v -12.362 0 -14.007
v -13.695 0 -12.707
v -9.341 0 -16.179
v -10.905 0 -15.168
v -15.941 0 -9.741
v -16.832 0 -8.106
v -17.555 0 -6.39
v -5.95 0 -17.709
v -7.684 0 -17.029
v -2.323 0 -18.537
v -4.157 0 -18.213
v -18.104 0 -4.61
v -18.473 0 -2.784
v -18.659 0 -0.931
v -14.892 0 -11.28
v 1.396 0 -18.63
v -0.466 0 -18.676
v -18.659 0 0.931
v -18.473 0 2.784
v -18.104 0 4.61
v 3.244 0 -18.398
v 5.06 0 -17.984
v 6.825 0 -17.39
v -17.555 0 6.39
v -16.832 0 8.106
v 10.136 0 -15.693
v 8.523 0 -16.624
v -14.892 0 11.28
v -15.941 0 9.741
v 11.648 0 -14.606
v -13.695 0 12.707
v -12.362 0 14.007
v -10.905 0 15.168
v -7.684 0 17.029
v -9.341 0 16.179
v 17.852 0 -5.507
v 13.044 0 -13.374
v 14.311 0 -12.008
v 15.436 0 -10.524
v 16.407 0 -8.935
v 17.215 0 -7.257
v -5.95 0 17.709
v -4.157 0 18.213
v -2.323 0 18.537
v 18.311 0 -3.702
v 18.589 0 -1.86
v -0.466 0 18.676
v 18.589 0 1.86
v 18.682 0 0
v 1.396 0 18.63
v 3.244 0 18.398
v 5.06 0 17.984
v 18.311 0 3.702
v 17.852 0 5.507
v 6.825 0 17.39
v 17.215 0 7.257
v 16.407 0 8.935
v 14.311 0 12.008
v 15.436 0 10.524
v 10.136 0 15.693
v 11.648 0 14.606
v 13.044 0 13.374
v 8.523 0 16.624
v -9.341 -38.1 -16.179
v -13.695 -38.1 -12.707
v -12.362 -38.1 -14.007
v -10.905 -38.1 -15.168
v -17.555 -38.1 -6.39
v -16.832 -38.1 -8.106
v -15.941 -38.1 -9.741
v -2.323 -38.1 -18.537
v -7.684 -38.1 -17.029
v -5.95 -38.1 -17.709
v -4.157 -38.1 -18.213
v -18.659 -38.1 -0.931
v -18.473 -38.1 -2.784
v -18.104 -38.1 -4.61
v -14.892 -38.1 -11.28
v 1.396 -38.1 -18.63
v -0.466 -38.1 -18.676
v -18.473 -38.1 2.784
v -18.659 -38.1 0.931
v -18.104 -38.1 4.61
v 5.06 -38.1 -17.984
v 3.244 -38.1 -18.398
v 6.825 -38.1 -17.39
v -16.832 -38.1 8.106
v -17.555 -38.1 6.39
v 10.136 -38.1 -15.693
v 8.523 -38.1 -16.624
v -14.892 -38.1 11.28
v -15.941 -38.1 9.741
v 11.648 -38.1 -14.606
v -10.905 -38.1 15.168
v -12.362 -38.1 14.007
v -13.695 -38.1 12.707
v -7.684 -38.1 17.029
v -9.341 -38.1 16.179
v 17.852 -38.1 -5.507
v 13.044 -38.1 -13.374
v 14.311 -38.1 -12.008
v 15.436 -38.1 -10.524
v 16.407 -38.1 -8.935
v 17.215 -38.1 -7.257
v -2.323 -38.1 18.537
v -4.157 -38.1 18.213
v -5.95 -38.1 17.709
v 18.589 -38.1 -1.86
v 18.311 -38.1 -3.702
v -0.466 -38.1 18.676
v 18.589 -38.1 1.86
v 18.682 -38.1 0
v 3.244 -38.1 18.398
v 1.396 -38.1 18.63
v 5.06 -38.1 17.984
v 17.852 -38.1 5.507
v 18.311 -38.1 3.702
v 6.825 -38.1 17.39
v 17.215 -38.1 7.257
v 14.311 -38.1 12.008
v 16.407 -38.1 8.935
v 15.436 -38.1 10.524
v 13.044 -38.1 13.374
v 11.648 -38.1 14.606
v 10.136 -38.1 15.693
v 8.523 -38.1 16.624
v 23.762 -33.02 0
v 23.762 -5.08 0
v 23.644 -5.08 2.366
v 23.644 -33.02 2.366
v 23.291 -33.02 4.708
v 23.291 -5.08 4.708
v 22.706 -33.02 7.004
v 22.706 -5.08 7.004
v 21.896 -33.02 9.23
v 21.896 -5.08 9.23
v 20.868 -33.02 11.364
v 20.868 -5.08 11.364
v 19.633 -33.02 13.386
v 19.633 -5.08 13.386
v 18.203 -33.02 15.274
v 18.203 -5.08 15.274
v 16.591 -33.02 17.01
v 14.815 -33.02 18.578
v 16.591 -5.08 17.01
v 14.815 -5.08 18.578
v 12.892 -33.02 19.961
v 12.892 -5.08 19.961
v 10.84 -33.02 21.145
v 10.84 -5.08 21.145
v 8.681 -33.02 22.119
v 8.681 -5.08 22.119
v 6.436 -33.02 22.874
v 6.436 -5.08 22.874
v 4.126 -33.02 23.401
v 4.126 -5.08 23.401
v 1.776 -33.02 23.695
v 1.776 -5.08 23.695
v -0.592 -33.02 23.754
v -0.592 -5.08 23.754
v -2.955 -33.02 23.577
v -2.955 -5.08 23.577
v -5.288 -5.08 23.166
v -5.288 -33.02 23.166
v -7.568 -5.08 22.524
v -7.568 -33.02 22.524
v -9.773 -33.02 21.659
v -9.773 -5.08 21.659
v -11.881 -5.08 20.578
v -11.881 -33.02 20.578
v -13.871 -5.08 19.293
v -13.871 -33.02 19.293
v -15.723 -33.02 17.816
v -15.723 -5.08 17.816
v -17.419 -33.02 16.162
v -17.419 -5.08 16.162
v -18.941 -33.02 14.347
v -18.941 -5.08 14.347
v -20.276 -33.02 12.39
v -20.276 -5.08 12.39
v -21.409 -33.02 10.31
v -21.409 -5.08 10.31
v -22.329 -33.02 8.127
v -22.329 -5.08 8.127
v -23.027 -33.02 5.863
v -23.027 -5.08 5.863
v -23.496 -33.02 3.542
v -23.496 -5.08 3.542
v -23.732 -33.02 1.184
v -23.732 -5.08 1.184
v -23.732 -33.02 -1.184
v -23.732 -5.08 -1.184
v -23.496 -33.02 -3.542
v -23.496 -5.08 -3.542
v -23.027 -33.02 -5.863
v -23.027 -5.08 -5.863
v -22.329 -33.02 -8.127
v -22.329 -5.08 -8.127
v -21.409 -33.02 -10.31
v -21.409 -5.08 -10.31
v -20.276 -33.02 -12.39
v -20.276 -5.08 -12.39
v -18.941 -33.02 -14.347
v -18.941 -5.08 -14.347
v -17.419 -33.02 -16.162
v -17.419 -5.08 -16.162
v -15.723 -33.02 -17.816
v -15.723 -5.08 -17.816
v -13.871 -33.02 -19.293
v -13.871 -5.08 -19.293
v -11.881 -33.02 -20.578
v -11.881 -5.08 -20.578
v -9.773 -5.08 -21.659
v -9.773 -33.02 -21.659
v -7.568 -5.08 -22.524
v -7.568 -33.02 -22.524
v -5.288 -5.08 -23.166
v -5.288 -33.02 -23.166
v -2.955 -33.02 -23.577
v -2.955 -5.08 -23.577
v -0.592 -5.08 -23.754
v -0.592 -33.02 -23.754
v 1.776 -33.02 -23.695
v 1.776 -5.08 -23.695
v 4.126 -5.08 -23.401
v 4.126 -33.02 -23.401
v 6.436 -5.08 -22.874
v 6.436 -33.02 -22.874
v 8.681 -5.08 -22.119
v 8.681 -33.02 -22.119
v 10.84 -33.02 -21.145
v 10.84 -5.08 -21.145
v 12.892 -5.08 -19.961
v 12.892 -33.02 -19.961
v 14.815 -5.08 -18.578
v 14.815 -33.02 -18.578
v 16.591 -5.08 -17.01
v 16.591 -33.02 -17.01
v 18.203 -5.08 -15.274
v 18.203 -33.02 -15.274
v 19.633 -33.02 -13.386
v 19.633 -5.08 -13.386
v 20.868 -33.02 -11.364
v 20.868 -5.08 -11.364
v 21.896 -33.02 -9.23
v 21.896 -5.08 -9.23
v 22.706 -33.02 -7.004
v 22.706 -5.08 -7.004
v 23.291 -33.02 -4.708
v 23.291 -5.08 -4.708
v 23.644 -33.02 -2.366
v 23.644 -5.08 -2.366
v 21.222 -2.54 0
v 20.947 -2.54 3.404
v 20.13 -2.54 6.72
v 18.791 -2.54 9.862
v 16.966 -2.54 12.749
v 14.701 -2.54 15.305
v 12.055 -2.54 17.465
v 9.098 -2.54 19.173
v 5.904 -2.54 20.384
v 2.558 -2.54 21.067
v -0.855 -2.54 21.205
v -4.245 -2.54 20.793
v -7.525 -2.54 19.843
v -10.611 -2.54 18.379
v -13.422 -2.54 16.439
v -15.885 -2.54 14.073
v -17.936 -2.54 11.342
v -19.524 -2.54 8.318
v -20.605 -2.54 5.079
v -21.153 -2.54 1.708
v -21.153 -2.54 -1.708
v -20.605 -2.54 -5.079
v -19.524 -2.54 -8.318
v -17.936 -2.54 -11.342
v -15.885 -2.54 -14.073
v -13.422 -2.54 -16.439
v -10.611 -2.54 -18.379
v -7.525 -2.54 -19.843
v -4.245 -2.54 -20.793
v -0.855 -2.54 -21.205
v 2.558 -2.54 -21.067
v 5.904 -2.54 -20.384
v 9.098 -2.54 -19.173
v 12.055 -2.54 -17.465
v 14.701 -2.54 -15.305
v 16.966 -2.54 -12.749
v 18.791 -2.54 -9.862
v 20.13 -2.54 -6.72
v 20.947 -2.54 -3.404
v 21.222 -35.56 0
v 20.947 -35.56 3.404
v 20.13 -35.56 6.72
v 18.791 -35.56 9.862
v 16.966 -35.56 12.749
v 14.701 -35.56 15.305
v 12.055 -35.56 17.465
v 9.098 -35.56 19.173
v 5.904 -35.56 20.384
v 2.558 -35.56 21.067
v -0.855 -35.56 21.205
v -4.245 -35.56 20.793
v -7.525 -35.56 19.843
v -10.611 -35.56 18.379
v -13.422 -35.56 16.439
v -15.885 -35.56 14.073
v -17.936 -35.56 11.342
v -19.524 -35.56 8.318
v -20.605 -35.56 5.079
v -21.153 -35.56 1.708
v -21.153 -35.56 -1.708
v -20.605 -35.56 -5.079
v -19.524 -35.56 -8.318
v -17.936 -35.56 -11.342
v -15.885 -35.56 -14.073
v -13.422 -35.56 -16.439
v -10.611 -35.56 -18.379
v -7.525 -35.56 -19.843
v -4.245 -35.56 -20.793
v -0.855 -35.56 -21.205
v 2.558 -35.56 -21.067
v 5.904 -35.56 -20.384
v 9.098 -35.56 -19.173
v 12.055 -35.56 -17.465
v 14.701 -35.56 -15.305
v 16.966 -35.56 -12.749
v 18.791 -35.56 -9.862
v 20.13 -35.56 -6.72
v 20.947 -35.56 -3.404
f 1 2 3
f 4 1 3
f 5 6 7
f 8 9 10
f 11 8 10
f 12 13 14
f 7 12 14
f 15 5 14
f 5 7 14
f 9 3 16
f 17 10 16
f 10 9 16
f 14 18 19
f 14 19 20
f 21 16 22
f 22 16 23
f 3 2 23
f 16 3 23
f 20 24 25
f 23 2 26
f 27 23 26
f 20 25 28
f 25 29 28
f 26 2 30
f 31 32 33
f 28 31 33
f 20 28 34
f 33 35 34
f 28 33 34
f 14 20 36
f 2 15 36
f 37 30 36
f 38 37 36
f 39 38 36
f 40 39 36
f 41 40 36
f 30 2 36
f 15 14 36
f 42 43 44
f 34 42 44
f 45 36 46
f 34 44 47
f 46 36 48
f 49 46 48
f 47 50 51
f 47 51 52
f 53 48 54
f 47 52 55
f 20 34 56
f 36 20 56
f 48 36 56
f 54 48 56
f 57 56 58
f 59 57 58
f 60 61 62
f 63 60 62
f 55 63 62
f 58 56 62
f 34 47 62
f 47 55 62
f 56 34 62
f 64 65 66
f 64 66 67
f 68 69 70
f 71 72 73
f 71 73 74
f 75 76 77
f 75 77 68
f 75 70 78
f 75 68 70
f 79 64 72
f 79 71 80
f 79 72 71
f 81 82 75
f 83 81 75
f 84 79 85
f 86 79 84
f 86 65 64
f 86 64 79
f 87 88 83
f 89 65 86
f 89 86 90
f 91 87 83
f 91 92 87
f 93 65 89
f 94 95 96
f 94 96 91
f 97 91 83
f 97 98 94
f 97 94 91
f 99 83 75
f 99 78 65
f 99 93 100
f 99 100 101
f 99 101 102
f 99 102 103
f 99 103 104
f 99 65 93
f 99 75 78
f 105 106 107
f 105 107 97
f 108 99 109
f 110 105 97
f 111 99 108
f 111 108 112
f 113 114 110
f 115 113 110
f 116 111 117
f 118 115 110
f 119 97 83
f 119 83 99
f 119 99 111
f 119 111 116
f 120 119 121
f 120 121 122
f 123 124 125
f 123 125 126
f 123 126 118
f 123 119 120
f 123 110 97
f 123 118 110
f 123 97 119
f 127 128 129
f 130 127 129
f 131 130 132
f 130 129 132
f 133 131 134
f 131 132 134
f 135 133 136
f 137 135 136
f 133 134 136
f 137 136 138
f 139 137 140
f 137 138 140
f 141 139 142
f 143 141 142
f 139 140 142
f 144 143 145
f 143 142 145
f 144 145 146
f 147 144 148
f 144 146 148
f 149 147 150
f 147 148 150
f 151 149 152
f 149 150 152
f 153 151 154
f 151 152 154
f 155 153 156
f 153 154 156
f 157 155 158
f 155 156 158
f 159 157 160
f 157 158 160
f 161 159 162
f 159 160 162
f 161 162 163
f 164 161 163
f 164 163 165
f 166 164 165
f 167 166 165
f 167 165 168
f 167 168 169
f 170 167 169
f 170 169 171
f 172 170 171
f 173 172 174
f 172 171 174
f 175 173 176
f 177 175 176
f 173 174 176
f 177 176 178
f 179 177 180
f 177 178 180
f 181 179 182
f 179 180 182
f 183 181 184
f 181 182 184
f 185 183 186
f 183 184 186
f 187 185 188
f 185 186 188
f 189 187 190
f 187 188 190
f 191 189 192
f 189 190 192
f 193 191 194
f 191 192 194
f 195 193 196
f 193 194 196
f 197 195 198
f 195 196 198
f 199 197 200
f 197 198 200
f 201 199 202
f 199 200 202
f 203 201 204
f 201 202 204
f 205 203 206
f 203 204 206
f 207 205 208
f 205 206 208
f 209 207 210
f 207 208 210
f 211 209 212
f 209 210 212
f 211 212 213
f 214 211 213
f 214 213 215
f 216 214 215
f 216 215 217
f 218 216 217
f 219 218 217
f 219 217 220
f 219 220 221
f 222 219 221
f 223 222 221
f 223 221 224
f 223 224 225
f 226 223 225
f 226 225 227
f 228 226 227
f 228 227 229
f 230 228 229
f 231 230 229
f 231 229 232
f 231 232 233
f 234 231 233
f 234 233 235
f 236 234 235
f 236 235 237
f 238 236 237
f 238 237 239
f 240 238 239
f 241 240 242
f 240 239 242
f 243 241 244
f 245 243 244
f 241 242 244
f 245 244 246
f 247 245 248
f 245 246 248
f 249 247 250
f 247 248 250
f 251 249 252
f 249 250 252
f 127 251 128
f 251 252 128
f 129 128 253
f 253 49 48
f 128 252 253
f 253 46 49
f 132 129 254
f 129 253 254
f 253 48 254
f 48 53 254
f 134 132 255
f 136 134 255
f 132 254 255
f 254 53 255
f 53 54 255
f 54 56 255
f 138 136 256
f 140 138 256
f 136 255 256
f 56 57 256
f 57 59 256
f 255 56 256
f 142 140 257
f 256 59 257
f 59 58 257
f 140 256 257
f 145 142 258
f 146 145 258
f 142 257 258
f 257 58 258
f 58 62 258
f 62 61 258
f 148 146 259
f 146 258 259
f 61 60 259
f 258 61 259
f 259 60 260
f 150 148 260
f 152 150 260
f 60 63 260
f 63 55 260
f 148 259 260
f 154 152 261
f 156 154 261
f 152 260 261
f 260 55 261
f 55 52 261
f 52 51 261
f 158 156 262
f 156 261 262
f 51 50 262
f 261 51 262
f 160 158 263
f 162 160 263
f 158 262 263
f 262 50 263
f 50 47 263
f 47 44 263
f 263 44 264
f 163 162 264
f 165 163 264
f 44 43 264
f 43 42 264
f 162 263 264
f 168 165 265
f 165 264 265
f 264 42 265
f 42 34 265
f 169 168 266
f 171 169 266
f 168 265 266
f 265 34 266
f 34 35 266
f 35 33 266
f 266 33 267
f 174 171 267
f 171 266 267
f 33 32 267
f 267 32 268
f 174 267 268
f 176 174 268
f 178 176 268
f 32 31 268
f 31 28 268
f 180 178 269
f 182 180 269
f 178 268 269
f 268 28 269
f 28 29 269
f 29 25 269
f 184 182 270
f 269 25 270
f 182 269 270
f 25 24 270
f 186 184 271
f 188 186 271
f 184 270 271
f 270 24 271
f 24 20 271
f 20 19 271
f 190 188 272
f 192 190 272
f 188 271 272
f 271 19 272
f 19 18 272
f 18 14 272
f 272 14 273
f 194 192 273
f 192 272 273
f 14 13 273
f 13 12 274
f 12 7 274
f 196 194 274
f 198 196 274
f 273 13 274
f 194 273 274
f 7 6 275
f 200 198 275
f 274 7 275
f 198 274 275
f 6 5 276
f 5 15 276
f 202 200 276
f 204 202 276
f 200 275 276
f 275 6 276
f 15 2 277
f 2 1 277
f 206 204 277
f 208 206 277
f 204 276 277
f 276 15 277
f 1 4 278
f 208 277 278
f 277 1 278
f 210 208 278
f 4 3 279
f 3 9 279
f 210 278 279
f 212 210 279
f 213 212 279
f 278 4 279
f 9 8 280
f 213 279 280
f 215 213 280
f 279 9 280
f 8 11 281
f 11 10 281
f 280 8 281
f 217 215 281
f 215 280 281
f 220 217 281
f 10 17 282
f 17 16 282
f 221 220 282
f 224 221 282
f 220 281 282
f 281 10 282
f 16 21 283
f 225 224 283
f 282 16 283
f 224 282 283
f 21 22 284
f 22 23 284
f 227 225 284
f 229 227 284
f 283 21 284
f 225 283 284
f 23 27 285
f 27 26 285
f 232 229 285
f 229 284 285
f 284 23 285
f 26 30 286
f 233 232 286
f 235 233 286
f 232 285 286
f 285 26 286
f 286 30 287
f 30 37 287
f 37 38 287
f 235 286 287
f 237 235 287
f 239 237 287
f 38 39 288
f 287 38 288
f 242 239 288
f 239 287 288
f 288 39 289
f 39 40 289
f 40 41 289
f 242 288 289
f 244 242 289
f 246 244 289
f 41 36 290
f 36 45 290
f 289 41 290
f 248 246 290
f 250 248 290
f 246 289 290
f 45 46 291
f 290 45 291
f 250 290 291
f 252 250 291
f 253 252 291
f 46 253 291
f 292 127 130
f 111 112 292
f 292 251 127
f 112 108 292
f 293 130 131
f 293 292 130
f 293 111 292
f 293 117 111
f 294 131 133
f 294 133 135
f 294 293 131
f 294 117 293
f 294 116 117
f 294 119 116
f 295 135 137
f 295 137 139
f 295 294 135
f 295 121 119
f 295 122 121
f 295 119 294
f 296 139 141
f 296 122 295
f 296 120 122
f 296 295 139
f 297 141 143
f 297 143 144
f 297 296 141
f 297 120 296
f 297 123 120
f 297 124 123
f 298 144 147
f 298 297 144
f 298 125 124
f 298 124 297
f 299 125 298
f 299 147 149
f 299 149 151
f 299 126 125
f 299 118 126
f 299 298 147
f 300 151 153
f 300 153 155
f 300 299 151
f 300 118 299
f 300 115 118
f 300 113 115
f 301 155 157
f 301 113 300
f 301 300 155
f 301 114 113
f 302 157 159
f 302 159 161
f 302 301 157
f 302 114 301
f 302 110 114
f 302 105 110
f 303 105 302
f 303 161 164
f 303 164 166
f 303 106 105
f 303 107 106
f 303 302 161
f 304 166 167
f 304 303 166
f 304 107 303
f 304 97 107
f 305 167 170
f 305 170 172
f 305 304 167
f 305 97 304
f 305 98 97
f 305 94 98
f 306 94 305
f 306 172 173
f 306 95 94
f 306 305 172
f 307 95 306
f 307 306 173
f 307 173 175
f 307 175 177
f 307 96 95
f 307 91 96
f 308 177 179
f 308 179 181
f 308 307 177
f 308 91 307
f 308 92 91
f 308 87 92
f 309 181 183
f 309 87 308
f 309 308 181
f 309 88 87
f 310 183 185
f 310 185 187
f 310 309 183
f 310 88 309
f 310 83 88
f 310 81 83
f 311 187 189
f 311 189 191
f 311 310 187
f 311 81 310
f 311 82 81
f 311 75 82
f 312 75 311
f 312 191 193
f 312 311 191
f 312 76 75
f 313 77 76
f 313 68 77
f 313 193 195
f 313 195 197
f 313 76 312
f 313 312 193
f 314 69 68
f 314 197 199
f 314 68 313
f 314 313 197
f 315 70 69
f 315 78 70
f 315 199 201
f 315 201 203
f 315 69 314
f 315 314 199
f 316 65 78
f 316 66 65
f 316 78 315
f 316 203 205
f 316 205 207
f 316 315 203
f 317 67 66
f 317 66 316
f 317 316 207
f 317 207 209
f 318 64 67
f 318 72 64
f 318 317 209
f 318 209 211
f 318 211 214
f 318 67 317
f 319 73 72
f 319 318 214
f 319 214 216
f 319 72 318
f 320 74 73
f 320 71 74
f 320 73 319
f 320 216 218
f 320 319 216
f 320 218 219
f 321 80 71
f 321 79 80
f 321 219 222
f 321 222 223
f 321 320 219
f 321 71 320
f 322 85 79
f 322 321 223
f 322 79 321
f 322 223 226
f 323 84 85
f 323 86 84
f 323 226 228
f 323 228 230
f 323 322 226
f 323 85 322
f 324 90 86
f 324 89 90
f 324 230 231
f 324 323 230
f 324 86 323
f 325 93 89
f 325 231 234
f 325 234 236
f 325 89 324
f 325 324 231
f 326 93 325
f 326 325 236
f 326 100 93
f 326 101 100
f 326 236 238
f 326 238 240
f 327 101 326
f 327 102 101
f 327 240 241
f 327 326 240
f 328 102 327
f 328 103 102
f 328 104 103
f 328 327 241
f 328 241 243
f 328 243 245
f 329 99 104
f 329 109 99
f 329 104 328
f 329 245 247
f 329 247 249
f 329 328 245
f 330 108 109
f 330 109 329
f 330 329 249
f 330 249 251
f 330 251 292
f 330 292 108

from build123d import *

# Parameters (mm, degrees)
F0_R     = 23.761832
F1_DEPTH = 38.1
F2_SIZE  = 5.08
F3_SIZE  = 5.08


with BuildPart() as f1:
    # F0 (on Front) → F1 (new body)
    with BuildSketch(Plane.XZ):
        Circle(F0_R)
    extrude(amount=F1_DEPTH)

    # F2
    f2_edges = [f1.edges().sort_by_distance(p)[0] for p in [
        (-23.761832, -38.1, 0),
    ]]
    chamfer(f2_edges, length=F2_SIZE)

    # F3
    f3_edges = [f1.edges().sort_by_distance(p)[0] for p in [
        (-23.761832, 0, 0),
    ]]
    chamfer(f3_edges, length=F3_SIZE)


solid = f1.part
